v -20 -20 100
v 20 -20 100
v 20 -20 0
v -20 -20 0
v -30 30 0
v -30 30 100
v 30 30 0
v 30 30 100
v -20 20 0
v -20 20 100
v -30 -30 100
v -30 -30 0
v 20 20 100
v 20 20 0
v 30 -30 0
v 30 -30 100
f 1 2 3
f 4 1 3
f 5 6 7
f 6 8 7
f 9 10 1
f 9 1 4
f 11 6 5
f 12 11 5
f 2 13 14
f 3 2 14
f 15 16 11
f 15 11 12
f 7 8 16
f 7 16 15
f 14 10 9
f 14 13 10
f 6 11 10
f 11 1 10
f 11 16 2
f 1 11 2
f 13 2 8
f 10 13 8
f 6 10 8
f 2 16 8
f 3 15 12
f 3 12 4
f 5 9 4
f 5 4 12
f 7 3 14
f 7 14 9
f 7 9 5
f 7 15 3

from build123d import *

# Parameters (mm, degrees)
SKETCH1_W           = 100
SKETCH1_H           = 60
BOSS_EXTRUDE1_DEPTH = 30
SKETCH2_W           = 100
SKETCH2_H           = 40
CUT_EXTRUDE1_DEPTH  = 20


with BuildPart() as part:
    # Sketch1 → Boss-Extrude1 (new, symmetric)
    with BuildSketch(Plane(origin=(0, 0, 0), x_dir=(0, 0, -1), z_dir=(1, 0, 0))):
        with Locations((-50, 0)):
            Rectangle(SKETCH1_W, SKETCH1_H)
    extrude(amount=BOSS_EXTRUDE1_DEPTH, both=True)

    # Sketch2 → Cut-Extrude1 (cut, symmetric)
    with BuildSketch(Plane(origin=(0, 0, 0), x_dir=(0, 0, -1), z_dir=(1, 0, 0))):
        with Locations((-50, 0)):
            Rectangle(SKETCH2_W, SKETCH2_H)
    extrude(amount=CUT_EXTRUDE1_DEPTH, both=True, mode=Mode.SUBTRACT)


solid = part.part
